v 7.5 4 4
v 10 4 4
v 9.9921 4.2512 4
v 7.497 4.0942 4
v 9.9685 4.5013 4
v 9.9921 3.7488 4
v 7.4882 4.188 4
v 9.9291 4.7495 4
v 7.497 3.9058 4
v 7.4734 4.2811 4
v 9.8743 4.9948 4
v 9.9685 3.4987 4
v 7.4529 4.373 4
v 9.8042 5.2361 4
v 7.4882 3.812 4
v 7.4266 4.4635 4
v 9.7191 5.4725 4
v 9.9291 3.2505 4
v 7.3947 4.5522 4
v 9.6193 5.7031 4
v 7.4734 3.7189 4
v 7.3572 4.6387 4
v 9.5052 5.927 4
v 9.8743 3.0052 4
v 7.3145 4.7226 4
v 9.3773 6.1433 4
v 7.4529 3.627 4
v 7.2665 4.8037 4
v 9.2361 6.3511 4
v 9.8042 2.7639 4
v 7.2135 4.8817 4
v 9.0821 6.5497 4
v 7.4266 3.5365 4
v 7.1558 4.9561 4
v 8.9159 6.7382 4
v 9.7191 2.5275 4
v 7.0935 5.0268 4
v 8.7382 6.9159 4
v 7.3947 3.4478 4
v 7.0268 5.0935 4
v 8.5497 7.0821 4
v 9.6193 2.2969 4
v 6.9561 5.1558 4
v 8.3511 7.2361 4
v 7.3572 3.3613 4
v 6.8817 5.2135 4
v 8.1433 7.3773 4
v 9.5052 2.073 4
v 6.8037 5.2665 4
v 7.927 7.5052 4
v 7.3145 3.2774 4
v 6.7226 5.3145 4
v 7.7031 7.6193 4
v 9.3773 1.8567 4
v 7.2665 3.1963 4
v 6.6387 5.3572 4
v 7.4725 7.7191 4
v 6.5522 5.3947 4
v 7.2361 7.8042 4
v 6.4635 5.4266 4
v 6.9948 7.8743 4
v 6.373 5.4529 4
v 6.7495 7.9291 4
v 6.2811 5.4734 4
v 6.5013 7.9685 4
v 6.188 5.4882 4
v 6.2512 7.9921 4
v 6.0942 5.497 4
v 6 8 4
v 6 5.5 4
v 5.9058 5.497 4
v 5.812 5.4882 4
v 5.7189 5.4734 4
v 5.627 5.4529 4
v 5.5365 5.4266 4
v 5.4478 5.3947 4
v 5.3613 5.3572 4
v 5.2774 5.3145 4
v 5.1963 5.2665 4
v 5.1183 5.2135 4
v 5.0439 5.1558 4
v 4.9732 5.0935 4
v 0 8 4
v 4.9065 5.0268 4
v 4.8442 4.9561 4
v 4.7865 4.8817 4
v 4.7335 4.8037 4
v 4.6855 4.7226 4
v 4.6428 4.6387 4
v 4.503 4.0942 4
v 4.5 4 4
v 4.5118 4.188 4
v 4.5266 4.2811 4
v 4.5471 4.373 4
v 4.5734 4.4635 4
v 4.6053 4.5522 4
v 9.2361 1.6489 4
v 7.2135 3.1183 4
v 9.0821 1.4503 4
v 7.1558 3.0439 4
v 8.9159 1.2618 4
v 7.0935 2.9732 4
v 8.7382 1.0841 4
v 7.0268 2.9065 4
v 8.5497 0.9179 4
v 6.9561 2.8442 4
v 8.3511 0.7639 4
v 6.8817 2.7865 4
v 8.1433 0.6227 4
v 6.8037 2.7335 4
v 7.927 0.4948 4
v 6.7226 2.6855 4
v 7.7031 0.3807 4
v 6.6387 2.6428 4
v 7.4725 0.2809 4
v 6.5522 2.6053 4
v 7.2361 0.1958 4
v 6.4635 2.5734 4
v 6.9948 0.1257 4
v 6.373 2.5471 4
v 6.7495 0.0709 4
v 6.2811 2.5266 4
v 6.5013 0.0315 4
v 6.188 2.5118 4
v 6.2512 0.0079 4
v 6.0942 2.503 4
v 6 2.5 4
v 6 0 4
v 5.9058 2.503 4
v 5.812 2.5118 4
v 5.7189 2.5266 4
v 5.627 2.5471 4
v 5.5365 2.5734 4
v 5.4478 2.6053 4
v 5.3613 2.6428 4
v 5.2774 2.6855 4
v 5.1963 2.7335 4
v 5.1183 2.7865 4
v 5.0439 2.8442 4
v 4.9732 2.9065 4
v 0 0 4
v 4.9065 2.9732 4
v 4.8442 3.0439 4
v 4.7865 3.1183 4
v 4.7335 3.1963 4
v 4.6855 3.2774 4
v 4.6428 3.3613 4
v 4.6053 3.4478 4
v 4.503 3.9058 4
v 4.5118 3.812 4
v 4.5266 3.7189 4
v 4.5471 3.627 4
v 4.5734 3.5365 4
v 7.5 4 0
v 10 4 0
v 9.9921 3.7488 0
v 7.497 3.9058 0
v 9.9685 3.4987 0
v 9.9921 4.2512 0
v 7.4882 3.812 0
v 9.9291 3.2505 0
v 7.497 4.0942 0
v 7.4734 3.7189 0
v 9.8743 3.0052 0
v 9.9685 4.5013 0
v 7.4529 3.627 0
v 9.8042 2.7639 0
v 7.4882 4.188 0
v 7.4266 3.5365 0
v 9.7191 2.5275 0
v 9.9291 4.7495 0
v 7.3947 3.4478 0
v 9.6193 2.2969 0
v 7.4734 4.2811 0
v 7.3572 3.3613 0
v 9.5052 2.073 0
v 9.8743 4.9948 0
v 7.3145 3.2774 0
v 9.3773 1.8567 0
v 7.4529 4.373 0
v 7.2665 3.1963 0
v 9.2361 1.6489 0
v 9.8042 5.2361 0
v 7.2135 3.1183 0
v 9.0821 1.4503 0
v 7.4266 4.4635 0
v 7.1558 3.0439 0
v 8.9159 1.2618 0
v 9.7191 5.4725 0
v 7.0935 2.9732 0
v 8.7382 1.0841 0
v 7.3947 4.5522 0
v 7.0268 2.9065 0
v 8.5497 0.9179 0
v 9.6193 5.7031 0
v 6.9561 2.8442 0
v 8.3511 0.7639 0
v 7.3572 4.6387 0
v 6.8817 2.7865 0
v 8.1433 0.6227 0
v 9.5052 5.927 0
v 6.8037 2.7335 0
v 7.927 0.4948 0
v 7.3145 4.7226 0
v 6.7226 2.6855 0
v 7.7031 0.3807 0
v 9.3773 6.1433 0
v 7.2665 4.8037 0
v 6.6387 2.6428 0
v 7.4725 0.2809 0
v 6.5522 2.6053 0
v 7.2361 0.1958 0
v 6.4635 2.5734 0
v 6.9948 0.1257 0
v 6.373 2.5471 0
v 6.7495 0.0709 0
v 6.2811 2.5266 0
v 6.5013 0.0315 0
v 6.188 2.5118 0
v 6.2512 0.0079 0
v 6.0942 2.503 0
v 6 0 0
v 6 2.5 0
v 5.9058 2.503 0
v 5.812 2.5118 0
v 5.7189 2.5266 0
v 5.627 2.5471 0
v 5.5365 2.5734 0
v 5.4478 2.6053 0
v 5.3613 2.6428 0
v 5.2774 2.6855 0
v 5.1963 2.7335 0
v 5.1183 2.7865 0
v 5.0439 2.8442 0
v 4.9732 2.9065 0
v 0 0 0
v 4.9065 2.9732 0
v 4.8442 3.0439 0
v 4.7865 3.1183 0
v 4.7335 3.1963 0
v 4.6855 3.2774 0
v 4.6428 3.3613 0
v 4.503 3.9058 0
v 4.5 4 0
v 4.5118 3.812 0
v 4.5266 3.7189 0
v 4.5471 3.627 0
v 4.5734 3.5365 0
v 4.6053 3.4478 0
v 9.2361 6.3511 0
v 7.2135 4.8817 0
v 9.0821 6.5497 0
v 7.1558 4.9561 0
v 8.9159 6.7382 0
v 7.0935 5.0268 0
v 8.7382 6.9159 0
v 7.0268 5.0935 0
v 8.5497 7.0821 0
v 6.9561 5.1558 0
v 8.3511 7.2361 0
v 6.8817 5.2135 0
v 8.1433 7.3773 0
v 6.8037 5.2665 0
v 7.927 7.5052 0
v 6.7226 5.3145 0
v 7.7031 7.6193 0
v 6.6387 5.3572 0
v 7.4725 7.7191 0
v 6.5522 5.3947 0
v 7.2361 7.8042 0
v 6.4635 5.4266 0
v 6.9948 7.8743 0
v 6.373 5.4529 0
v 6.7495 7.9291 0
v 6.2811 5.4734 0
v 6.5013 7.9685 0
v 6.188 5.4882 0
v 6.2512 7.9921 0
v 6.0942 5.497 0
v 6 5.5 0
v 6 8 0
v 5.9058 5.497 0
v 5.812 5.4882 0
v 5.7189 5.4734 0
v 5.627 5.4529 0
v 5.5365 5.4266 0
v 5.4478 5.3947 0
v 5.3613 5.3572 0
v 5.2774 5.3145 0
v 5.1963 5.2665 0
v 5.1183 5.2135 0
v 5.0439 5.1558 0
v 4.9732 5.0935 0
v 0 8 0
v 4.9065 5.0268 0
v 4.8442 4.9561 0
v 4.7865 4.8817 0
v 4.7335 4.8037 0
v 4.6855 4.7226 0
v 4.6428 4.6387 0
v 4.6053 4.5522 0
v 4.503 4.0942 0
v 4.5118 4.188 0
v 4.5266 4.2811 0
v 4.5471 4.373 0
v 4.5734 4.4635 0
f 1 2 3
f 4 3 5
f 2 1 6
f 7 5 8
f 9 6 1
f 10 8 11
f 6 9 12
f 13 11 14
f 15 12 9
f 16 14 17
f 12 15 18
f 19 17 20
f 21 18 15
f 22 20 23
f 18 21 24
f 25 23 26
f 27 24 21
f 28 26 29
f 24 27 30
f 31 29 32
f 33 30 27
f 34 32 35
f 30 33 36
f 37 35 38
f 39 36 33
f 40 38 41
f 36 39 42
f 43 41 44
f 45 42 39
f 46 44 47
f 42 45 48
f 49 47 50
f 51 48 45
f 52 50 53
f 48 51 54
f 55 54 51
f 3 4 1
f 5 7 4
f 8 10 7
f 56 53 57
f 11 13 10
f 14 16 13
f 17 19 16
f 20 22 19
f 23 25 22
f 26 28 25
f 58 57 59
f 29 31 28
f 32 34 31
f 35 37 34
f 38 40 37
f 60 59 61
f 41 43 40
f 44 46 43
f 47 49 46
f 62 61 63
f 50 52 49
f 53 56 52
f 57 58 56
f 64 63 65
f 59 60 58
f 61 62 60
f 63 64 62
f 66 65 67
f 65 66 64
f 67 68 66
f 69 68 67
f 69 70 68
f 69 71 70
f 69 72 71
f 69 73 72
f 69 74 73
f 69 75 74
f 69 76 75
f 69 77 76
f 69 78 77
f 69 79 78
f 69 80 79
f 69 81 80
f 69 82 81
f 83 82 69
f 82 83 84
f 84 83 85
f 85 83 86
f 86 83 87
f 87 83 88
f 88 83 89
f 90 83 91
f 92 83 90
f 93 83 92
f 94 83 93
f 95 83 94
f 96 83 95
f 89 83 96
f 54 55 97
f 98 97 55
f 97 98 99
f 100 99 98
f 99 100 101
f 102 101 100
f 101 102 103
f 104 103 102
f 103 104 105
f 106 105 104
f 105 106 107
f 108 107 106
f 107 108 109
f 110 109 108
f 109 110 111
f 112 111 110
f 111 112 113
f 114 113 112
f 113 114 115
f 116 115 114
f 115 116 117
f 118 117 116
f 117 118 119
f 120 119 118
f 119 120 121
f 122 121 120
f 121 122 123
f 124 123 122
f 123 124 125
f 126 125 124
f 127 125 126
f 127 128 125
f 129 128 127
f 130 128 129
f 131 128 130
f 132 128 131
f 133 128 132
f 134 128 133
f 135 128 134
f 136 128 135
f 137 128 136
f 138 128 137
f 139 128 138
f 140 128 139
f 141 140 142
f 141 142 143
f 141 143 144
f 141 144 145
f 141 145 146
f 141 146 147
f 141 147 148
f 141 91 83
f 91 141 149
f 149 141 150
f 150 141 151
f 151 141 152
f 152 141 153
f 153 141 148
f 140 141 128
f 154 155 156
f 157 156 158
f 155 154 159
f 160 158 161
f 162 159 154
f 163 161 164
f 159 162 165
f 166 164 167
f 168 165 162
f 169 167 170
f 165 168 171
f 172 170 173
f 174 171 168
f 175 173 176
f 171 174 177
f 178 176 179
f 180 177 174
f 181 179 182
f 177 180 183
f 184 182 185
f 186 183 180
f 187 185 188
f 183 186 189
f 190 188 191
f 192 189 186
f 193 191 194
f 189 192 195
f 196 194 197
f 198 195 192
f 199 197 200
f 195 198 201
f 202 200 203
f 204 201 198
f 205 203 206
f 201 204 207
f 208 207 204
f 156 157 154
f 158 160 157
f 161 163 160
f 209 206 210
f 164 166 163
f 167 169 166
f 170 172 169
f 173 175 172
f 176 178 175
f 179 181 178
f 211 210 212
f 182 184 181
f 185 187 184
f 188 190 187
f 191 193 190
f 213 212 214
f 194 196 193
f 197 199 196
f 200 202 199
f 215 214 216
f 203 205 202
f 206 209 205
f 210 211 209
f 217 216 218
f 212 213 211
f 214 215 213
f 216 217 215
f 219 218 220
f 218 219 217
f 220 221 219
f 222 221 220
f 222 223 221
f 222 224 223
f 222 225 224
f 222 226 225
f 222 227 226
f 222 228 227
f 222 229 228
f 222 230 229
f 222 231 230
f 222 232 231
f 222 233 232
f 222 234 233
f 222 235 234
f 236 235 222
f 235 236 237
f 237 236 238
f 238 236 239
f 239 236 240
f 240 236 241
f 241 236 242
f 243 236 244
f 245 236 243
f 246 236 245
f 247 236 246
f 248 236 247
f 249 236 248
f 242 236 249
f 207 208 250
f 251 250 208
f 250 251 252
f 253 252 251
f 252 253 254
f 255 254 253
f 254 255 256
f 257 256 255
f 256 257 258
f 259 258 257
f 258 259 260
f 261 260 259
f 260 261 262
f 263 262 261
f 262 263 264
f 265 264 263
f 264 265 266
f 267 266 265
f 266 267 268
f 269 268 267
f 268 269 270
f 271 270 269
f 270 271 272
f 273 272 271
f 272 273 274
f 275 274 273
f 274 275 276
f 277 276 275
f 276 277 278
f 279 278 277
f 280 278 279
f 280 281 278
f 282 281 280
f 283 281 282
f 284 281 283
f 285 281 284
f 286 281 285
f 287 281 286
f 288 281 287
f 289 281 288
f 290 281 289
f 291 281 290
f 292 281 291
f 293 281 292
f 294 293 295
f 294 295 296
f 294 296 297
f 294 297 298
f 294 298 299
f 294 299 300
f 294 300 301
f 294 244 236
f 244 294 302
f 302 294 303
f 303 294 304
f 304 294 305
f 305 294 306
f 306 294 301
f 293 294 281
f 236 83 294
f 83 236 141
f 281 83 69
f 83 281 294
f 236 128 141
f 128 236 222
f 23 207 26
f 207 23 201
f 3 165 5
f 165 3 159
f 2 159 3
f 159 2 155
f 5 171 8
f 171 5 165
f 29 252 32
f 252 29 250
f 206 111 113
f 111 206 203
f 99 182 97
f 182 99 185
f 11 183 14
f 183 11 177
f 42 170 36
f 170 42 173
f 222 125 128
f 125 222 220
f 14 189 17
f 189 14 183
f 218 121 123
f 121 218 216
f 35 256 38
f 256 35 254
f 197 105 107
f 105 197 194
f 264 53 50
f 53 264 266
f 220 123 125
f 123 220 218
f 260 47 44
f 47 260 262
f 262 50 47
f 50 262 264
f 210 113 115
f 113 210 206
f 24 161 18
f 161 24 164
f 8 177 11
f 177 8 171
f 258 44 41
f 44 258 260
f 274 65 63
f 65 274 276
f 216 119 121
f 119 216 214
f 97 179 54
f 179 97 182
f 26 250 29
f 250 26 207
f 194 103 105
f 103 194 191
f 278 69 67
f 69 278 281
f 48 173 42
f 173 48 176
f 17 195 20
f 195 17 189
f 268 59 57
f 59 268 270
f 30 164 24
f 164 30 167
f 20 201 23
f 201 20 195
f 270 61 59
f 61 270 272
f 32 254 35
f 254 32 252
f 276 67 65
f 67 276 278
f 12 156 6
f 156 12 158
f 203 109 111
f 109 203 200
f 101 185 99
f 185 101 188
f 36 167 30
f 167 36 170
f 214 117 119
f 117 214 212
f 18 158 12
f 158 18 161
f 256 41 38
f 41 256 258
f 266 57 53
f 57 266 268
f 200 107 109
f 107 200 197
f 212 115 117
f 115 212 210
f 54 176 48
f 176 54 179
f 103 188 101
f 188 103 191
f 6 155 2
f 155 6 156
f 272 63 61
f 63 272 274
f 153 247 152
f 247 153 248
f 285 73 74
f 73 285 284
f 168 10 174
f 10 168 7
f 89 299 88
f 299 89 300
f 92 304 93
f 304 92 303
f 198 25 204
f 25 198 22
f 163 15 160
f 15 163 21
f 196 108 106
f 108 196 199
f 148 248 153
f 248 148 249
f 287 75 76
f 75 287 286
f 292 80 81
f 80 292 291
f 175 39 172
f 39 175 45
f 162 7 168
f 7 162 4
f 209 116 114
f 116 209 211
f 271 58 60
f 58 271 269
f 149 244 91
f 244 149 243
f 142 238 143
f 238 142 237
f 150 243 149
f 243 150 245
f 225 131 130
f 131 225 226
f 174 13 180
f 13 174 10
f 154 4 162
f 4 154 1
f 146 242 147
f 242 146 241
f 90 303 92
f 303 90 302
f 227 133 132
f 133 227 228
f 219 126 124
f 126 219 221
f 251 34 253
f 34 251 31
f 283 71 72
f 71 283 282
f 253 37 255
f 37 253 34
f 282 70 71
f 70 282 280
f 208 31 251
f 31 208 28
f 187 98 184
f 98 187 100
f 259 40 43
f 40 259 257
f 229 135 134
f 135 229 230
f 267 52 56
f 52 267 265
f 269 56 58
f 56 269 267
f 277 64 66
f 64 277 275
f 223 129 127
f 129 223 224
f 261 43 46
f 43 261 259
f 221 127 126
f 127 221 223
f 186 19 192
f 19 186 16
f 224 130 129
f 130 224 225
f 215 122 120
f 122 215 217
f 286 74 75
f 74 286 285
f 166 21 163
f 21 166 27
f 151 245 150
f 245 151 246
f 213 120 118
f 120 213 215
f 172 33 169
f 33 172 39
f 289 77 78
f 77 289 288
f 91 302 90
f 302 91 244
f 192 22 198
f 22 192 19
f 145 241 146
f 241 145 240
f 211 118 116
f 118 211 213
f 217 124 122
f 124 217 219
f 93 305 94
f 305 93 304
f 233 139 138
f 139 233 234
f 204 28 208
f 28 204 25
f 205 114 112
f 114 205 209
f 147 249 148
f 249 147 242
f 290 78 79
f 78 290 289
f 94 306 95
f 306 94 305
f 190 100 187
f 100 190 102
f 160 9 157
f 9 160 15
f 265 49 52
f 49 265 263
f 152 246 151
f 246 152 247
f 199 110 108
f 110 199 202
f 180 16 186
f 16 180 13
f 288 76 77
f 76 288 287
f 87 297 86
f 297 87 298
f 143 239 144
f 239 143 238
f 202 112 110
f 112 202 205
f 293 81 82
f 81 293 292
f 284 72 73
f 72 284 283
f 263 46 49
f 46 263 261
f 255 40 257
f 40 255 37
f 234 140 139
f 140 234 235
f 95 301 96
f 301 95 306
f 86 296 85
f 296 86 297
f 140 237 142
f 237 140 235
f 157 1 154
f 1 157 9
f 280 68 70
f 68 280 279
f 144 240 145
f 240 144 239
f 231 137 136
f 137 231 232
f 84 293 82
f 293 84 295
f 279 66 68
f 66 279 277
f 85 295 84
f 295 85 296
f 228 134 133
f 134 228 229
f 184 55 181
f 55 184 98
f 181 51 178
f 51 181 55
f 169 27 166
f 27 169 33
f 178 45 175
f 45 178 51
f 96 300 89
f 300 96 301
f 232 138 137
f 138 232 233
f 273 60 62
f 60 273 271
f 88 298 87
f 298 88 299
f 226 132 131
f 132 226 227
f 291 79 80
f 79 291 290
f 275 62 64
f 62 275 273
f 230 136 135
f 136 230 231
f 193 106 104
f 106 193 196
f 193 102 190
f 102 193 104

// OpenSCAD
module SchraubensenkeNegativ(diameter = 3) {
    // 3 hält gerade so, bei kleinerem Durchmesser macht die Brücke oben Probleme.
    // Besser bei Bedarf noch eine Mutter von hinten dran machen
    cylinder(h=20, d=diameter, center=true);
}

module SchraubensenkenHalter() {
    difference() {
        union() {
            cube([6,8,4]);
            translate([6,4,0])cylinder(d=8,h=4);
        };
        translate([6,4,0])SchraubensenkeNegativ();
    }
}

$fn = 100;
SchraubensenkenHalter();
